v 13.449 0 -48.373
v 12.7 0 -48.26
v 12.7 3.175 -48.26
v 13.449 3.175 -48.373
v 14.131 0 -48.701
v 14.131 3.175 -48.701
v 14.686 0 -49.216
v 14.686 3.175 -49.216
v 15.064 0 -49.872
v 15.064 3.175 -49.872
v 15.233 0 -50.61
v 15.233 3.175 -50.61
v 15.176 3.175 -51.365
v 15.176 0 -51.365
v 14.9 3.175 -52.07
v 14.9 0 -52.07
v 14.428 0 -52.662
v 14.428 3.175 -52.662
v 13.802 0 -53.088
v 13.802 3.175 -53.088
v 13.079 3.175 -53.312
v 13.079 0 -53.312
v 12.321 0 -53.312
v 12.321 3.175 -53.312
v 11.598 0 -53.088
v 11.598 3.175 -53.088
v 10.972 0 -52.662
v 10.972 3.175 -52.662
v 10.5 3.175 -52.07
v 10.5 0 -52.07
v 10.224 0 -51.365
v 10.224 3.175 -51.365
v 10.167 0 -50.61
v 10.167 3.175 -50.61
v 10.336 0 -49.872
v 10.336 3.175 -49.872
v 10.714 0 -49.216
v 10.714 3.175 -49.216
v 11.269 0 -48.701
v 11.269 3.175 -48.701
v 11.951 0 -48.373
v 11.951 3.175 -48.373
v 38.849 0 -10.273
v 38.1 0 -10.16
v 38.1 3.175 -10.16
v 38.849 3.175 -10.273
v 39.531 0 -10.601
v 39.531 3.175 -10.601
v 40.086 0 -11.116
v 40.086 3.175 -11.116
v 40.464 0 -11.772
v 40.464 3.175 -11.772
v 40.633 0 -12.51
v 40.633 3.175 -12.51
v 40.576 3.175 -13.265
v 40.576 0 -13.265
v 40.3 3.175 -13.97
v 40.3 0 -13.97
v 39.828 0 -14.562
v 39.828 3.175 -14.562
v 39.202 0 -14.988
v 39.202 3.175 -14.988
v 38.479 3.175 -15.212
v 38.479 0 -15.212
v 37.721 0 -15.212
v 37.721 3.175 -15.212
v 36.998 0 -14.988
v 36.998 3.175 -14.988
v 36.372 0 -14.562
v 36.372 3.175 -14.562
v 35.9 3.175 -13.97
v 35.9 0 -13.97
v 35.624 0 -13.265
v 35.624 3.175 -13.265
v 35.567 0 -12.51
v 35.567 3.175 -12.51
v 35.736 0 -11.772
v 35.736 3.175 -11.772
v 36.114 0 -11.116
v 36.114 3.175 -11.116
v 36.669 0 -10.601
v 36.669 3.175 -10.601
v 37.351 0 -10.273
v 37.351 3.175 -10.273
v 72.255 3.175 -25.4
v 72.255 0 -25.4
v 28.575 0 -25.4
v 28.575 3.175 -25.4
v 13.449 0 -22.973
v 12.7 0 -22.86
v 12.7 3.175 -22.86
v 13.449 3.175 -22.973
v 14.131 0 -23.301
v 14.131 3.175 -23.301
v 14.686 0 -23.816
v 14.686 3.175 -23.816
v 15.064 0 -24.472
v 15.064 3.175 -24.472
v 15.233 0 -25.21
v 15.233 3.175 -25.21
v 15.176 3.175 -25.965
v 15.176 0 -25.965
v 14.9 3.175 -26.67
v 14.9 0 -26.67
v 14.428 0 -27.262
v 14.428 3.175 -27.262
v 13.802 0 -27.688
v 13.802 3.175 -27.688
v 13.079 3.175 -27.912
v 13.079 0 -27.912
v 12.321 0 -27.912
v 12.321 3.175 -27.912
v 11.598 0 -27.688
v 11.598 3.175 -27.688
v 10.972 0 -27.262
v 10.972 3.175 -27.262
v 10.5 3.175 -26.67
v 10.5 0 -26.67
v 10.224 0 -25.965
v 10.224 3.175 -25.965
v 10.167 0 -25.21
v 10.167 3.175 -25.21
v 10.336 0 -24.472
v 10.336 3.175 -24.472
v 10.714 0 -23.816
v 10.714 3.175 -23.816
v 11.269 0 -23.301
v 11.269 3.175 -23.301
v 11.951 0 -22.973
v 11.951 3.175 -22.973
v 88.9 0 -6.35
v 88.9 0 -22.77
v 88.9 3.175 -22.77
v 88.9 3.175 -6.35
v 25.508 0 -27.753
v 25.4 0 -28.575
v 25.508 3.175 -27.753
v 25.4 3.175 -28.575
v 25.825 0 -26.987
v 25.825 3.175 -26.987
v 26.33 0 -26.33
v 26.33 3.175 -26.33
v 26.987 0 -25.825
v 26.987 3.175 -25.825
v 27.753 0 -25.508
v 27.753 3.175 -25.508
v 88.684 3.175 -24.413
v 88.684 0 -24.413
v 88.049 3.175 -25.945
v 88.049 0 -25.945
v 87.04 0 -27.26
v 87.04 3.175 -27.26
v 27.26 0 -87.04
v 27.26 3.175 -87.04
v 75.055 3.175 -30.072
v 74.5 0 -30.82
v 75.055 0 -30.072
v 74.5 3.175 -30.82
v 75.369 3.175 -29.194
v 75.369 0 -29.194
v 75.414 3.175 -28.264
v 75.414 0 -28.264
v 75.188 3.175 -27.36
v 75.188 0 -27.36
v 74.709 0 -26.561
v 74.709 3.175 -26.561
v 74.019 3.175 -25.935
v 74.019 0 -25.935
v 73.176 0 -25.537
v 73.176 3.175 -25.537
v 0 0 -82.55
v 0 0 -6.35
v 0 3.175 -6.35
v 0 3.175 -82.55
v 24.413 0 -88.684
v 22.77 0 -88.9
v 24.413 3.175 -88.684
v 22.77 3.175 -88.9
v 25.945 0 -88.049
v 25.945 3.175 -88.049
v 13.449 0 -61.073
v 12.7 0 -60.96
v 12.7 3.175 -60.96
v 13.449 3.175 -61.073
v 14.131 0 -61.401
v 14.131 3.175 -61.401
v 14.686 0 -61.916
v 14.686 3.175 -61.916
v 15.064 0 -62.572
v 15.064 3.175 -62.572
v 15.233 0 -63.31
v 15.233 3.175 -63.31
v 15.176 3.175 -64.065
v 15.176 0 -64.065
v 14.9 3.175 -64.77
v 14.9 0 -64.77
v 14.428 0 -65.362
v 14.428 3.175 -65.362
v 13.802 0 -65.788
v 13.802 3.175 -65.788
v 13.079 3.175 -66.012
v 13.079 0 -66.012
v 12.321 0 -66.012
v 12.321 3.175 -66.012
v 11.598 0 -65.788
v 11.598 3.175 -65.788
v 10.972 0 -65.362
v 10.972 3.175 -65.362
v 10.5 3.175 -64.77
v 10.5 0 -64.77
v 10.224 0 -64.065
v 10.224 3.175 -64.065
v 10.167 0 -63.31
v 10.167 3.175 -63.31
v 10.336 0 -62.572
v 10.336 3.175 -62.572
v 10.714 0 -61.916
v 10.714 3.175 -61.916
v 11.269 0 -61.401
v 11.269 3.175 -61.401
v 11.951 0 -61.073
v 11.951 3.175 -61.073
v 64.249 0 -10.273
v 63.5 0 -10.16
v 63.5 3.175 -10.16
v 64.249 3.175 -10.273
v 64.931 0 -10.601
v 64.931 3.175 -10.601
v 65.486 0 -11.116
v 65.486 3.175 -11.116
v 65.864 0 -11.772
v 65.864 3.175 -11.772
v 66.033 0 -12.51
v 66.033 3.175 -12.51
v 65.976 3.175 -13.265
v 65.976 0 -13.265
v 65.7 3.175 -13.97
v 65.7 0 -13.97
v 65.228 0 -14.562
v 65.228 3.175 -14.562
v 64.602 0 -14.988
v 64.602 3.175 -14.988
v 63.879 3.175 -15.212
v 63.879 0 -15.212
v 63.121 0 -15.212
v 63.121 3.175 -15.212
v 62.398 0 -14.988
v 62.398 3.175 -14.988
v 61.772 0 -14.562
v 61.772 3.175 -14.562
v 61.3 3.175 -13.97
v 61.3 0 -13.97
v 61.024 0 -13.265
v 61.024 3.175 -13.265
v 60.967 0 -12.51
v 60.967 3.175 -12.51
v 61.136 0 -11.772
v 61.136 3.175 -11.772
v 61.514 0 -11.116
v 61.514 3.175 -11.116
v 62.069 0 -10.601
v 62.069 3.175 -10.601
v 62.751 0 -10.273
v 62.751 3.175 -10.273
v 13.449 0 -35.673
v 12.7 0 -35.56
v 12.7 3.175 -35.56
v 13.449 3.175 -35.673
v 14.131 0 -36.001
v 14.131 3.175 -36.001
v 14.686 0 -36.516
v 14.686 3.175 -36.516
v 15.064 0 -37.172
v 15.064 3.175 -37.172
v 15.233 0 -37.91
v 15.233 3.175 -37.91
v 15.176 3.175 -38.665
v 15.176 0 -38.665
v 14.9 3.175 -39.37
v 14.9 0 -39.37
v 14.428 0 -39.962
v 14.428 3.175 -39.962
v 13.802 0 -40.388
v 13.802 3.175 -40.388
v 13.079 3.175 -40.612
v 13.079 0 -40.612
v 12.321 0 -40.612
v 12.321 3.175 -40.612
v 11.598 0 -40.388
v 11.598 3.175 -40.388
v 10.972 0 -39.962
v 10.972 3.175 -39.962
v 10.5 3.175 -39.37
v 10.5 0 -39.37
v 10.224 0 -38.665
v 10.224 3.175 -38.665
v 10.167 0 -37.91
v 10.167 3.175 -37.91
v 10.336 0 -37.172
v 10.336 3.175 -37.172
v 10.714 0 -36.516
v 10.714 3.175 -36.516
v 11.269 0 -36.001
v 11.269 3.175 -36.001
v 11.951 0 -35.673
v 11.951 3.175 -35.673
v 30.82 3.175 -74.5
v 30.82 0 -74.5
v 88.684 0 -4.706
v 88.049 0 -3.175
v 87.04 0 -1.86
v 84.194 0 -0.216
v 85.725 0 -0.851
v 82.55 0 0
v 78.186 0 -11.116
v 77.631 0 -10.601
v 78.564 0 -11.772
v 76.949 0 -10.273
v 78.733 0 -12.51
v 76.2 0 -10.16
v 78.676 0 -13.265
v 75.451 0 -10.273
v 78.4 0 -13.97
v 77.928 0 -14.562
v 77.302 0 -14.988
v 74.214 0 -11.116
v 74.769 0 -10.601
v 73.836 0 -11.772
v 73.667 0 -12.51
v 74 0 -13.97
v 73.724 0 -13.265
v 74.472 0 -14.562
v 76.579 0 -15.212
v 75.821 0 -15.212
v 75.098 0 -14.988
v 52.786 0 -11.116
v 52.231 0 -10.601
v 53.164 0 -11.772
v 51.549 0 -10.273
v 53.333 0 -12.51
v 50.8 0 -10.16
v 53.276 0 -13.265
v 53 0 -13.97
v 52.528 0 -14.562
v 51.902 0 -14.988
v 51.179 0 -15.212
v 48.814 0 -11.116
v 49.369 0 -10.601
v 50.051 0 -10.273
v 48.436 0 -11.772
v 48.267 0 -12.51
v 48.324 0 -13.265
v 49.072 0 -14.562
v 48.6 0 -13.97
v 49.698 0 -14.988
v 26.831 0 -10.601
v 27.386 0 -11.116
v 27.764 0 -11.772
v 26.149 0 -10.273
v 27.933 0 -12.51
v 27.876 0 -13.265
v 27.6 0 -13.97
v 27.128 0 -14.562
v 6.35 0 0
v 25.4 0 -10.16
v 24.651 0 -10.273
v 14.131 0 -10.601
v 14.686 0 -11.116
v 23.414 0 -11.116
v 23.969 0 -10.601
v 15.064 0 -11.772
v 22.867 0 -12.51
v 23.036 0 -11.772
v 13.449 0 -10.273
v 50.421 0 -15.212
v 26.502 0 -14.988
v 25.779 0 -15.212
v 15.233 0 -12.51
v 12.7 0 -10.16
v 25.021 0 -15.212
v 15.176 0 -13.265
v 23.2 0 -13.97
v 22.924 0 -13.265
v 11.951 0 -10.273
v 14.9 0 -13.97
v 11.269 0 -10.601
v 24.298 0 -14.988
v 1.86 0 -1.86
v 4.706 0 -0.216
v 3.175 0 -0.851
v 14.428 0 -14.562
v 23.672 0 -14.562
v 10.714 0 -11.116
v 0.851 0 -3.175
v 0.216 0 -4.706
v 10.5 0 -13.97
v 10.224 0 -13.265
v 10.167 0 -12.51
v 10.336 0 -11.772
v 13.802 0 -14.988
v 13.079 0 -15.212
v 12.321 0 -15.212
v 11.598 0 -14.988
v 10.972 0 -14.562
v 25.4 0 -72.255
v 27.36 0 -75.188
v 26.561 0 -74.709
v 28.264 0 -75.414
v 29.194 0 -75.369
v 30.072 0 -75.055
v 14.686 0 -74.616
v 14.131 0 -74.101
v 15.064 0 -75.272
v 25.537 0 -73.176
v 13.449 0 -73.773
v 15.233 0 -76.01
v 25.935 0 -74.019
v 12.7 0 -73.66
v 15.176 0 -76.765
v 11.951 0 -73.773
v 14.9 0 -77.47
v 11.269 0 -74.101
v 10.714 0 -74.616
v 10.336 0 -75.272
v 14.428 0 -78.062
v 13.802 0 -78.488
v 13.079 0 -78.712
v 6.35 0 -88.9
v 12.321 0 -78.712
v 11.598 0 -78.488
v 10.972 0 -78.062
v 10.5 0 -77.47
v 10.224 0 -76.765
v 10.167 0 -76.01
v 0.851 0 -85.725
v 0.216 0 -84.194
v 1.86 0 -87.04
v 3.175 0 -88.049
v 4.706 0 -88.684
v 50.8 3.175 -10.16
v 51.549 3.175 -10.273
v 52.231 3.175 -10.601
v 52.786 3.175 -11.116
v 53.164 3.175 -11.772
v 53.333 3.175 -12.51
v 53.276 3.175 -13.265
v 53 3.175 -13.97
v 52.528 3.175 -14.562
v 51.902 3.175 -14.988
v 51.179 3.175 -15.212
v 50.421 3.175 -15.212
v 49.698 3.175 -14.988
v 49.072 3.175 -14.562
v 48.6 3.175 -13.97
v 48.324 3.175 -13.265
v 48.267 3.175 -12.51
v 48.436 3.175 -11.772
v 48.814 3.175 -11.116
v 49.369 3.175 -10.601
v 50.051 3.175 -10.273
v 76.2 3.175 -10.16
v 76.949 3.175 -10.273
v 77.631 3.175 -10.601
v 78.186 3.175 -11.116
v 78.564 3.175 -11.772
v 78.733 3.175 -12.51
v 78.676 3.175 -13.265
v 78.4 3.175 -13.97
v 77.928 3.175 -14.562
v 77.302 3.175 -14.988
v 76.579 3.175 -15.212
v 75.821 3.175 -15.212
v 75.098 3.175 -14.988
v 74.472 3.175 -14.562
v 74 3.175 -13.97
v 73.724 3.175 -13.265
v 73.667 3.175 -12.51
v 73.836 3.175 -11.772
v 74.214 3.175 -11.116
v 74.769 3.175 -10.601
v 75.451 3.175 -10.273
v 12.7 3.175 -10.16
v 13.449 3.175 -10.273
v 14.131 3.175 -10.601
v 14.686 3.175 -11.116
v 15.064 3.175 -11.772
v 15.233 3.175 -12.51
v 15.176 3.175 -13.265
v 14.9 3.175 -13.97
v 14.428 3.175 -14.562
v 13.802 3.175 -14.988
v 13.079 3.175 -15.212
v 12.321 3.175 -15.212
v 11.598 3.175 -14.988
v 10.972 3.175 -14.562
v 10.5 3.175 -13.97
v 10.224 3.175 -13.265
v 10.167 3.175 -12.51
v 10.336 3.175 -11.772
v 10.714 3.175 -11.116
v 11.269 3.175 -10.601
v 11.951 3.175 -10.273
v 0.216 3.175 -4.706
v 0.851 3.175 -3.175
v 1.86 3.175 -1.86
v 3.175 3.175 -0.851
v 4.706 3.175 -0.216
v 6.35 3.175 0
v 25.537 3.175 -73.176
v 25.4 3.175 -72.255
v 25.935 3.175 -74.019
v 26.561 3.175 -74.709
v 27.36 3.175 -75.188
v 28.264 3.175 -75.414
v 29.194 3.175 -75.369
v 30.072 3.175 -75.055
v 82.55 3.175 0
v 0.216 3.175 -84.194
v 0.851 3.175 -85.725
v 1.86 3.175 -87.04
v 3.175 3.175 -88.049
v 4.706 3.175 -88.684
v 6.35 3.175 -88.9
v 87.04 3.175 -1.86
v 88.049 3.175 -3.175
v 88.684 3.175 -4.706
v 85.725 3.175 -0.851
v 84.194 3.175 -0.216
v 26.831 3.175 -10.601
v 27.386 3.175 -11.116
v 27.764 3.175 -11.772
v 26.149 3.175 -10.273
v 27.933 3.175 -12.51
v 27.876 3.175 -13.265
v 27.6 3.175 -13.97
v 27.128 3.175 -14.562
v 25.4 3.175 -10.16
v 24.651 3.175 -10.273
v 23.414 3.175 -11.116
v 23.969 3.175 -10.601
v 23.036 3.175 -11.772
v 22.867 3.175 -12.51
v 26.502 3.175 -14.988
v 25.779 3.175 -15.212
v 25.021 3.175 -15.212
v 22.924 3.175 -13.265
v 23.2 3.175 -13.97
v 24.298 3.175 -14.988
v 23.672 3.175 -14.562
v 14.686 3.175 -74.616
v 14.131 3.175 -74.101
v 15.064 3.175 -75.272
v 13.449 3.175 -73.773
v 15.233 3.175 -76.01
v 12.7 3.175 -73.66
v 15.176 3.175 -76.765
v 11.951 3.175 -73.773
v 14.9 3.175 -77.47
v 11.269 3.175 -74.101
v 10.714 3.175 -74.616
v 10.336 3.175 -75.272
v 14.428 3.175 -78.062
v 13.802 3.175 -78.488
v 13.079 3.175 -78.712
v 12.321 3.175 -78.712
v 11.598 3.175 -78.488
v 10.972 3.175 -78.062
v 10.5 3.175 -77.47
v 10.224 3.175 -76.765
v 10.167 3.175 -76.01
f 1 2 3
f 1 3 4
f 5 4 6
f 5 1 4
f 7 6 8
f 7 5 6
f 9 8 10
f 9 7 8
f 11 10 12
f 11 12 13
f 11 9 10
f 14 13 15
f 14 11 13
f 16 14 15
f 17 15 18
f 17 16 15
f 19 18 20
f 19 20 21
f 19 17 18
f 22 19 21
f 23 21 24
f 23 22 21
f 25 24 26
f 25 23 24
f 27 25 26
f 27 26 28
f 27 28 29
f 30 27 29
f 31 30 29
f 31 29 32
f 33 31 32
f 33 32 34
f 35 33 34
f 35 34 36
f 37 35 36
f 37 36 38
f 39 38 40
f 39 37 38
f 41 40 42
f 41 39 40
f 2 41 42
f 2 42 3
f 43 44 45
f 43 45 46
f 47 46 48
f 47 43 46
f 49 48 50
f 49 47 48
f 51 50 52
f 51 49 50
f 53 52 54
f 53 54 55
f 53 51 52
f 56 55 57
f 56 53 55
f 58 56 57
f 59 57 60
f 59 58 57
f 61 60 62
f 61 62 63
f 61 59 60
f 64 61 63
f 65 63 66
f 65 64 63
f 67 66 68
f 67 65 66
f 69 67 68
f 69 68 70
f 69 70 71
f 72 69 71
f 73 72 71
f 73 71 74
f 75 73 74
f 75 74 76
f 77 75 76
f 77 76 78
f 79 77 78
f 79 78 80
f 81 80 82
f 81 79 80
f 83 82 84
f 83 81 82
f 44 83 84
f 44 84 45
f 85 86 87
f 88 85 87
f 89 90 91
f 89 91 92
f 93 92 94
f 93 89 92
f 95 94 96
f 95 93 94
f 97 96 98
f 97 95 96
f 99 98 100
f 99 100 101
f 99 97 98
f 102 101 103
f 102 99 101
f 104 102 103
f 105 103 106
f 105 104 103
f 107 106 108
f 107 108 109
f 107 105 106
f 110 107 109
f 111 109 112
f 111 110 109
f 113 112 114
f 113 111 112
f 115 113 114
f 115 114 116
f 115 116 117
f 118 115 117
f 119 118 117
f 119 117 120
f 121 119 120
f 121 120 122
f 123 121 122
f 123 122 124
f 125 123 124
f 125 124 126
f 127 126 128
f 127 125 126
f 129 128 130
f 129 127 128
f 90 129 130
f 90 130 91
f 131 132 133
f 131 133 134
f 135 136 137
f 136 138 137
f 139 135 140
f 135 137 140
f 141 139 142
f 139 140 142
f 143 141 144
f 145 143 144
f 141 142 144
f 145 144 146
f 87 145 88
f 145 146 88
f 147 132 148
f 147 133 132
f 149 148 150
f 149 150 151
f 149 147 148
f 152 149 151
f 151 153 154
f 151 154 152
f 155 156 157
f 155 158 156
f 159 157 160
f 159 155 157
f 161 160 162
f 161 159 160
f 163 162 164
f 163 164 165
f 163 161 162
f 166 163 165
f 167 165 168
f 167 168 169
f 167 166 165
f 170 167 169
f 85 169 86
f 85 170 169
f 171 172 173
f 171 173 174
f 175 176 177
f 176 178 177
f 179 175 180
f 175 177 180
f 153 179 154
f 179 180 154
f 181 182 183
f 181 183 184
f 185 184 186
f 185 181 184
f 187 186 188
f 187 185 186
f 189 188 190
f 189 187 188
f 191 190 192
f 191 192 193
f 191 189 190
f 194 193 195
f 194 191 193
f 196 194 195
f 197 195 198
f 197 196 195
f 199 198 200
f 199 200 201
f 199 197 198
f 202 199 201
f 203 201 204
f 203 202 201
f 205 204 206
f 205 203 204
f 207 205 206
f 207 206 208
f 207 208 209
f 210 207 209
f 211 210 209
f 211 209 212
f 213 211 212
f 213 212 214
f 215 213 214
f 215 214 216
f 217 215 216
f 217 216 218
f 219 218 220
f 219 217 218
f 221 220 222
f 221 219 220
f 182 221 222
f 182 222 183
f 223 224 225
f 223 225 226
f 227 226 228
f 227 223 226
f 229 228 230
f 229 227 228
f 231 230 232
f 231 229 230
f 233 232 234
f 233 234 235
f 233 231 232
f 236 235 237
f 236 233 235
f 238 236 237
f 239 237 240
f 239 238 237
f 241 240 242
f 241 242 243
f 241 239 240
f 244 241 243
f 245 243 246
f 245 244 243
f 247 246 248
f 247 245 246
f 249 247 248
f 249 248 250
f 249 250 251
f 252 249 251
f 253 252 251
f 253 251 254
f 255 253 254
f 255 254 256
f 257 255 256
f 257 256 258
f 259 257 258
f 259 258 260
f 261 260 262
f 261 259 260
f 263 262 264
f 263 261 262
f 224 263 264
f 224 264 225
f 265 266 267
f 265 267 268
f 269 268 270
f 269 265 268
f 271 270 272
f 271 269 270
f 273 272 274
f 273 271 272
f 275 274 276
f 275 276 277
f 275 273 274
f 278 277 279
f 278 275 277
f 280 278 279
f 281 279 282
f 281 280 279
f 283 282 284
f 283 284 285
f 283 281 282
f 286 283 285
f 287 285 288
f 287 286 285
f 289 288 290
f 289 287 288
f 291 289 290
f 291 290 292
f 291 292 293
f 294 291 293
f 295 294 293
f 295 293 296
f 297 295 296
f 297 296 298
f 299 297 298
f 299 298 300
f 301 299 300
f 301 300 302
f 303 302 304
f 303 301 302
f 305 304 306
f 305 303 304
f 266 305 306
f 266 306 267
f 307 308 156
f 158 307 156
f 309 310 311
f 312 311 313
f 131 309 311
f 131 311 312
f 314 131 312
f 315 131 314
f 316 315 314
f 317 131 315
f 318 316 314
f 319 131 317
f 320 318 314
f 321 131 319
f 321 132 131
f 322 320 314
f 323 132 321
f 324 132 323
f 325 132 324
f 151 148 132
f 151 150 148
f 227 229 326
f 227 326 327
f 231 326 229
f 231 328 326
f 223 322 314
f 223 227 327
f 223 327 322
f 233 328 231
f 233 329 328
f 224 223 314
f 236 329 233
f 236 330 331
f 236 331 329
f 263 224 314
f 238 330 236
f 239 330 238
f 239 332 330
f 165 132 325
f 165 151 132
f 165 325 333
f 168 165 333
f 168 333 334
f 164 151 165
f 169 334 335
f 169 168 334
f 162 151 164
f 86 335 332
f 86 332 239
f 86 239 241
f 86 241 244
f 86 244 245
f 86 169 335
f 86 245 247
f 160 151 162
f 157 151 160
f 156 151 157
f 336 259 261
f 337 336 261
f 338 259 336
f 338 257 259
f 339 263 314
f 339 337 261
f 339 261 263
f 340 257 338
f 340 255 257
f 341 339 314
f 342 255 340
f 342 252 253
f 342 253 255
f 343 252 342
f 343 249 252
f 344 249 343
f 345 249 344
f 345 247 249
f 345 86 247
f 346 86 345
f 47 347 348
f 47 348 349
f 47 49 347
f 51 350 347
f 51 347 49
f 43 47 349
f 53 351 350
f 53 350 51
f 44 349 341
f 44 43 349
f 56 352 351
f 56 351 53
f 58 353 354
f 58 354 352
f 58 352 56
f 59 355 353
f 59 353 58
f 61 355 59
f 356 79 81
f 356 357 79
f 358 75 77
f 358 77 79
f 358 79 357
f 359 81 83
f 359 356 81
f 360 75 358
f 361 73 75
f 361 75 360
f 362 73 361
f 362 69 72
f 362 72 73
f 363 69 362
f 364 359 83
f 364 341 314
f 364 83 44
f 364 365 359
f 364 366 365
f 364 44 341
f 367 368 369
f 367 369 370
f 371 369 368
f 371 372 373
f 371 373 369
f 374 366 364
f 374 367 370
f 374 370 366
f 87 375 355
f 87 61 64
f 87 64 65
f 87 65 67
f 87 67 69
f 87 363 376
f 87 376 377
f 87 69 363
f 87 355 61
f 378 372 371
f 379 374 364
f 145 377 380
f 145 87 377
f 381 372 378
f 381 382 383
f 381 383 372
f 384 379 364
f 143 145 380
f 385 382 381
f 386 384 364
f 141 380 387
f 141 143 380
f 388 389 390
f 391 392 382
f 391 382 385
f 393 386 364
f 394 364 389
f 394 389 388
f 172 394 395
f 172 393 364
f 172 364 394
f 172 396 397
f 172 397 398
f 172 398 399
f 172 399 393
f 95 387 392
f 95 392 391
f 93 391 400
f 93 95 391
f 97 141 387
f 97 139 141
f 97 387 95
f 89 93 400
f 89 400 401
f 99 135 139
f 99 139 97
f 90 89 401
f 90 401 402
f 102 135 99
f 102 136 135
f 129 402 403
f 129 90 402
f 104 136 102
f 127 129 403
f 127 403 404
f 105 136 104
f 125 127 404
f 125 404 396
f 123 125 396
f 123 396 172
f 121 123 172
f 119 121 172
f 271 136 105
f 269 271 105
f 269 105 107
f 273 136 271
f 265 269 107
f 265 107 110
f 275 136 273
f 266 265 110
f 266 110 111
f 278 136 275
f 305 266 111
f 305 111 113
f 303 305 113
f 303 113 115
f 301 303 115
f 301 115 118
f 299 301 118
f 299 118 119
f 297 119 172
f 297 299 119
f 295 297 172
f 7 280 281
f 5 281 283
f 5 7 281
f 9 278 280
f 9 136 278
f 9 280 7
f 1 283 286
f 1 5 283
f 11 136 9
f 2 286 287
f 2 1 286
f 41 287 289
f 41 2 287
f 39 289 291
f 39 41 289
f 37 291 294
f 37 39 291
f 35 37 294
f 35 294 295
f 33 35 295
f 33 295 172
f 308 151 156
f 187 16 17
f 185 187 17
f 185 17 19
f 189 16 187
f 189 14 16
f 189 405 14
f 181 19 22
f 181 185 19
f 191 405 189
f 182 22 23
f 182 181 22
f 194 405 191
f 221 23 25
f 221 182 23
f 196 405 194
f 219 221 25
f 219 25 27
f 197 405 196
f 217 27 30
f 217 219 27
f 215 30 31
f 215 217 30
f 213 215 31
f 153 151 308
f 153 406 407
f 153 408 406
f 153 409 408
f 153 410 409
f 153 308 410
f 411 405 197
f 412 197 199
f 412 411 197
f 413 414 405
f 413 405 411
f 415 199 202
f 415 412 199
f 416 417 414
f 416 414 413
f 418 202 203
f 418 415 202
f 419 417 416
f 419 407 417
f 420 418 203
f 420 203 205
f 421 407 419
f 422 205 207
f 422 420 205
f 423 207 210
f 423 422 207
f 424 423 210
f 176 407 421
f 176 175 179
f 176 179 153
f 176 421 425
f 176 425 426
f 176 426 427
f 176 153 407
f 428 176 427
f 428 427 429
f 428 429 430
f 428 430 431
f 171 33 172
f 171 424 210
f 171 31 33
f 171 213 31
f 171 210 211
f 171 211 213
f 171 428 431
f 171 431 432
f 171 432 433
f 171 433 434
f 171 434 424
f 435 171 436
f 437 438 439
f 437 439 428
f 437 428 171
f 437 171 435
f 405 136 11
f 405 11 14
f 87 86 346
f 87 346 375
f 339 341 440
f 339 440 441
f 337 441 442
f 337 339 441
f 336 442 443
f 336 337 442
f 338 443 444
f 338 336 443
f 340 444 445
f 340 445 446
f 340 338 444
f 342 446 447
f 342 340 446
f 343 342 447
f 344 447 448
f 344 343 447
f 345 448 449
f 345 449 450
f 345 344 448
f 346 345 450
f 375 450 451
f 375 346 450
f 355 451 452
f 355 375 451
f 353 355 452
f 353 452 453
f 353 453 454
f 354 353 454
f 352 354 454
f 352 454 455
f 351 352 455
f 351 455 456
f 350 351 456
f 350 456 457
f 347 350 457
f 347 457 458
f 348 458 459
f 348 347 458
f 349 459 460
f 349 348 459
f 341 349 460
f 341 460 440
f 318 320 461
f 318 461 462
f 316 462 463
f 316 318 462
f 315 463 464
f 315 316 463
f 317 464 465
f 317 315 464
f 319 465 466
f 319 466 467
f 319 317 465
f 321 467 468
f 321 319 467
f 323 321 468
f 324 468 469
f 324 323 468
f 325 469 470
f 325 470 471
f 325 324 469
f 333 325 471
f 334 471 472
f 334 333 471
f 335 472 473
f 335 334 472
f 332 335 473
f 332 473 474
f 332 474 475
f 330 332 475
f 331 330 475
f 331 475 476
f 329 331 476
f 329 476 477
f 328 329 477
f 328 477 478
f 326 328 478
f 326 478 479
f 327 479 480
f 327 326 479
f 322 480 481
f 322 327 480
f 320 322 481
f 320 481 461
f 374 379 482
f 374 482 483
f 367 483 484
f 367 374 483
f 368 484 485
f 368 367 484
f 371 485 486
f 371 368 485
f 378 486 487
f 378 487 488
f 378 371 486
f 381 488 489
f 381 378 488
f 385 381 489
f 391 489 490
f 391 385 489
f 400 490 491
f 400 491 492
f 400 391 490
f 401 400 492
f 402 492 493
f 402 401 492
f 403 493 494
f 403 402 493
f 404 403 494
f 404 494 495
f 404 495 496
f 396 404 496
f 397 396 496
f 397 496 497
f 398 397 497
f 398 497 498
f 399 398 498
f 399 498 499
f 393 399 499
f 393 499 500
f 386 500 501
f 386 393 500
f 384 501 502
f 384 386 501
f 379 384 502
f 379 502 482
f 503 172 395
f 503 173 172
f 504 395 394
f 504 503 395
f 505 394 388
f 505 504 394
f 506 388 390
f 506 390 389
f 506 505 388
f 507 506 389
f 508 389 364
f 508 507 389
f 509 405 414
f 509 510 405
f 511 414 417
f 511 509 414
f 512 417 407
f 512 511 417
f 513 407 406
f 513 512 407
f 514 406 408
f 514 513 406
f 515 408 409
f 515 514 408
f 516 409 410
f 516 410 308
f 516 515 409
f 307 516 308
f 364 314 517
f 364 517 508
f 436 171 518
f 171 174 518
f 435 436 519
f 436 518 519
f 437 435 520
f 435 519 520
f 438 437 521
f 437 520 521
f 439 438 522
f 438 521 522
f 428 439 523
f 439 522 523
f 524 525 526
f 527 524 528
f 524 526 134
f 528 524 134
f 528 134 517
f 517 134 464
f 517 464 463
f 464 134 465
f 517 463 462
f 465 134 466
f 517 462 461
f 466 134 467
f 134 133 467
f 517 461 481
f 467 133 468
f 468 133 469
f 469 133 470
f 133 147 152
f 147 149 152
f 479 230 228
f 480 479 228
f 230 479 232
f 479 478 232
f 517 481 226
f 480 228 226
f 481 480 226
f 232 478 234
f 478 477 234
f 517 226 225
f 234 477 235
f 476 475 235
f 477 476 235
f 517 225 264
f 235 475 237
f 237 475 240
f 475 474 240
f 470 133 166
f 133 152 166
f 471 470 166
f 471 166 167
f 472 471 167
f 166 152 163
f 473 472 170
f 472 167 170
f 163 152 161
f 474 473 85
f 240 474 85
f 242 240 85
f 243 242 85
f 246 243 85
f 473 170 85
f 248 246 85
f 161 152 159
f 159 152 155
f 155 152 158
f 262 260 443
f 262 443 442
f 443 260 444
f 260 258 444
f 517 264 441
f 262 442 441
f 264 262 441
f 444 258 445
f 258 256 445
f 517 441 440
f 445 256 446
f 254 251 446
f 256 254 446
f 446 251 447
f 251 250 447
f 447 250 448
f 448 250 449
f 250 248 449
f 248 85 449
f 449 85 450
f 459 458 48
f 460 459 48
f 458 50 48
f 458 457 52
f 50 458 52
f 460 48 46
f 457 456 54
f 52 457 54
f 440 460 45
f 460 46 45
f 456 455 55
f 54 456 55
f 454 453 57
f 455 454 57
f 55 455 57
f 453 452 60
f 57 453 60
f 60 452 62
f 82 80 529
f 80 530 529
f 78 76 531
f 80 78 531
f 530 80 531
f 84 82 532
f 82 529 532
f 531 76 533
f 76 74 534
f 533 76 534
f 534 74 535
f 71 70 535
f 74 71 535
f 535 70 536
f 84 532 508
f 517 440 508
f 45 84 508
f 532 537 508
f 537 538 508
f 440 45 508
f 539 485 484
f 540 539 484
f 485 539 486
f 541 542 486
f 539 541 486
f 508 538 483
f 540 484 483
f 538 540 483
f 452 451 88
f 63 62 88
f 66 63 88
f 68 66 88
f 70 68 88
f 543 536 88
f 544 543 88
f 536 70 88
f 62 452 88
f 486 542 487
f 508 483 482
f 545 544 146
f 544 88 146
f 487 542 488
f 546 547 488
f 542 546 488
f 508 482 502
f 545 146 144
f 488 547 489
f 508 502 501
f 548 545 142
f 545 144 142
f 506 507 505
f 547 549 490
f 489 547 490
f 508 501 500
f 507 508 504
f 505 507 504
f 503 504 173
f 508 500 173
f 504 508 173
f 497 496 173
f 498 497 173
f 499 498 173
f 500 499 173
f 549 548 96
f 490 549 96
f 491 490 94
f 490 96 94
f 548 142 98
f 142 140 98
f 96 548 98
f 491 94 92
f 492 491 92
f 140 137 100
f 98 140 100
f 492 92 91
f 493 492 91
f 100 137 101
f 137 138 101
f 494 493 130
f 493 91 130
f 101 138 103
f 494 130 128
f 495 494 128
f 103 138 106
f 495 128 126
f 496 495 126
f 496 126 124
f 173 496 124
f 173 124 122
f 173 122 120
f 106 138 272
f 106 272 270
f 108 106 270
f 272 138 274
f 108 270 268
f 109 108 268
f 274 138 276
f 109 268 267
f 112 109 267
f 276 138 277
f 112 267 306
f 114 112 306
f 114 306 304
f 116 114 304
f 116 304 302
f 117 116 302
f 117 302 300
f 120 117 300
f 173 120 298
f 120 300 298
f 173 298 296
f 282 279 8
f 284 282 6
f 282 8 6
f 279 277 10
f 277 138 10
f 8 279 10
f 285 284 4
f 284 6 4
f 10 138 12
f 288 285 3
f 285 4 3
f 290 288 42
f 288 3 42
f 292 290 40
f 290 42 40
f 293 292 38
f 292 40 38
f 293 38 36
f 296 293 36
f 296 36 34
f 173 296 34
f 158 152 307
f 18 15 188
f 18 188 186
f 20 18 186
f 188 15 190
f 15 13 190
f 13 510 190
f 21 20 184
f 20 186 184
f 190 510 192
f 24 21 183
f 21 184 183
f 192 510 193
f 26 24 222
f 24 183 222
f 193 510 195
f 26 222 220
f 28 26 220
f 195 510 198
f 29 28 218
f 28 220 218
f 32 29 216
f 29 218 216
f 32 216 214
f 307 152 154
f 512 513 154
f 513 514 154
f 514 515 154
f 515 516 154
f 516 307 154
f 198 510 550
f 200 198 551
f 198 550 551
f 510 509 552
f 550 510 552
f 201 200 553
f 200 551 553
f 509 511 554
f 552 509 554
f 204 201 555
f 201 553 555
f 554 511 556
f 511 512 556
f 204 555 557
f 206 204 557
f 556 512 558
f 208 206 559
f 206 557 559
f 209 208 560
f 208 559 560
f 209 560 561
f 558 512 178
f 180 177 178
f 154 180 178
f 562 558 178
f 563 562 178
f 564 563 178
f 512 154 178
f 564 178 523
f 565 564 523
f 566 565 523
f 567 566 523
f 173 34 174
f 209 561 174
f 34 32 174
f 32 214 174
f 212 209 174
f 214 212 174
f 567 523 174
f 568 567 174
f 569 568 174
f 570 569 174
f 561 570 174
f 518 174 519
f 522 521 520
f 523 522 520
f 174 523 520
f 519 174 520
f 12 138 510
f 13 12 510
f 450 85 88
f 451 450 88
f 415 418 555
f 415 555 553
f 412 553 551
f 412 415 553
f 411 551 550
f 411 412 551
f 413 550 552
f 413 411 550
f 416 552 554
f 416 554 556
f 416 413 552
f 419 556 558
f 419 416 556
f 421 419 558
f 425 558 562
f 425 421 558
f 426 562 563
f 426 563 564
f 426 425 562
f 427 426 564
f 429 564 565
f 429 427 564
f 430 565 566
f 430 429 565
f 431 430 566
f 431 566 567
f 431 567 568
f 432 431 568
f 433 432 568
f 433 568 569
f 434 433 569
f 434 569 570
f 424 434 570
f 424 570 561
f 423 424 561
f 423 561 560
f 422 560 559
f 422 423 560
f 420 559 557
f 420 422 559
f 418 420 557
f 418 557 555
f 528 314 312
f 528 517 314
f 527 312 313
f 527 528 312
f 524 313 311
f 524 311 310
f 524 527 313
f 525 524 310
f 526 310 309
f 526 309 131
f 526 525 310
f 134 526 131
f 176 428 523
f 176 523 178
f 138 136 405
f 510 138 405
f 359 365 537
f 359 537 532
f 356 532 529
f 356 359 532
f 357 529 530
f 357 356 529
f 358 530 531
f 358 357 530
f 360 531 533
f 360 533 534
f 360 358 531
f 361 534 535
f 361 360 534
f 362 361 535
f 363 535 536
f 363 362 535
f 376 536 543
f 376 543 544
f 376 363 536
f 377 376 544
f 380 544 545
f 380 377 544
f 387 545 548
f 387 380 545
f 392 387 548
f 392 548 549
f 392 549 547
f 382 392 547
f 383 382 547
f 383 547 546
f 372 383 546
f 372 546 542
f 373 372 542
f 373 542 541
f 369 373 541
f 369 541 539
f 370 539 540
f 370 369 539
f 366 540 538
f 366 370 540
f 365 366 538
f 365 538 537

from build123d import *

# Parameters (mm, degrees)
SKETCH1_R           = 2.54
BOSS_EXTRUDE1_DEPTH = 3.175
FILLET1_R           = 6.35
FILLET2_R           = 3.175


with BuildPart() as part:
    # Sketch1 → Boss-Extrude1 (new body)
    with BuildSketch(Plane(origin=(0, 0, 0), x_dir=(1, 0, 0), z_dir=(0, 1, 0))):
        Polygon((0, 0), (0, 88.9), (25.4, 88.9), (88.9, 25.4), (88.9, 0), align=None)
        with Locations(Location((12.7, 12.7, 0), (0, 0, 270))):
            Circle(SKETCH1_R, mode=Mode.SUBTRACT)
        with Locations(Location((25.4, 12.7, 0), (0, 0, 270))):
            Circle(SKETCH1_R, mode=Mode.SUBTRACT)
        with Locations(Location((38.1, 12.7, 0), (0, 0, 270))):
            Circle(SKETCH1_R, mode=Mode.SUBTRACT)
        with Locations(Location((50.8, 12.7, 0), (0, 0, 270))):
            Circle(SKETCH1_R, mode=Mode.SUBTRACT)
        with Locations(Location((63.5, 12.7, 0), (0, 0, 270))):
            Circle(SKETCH1_R, mode=Mode.SUBTRACT)
        with Locations(Location((76.2, 12.7, 0), (0, 0, 270))):
            Circle(SKETCH1_R, mode=Mode.SUBTRACT)
        with Locations(Location((12.7, 25.4, 0), (0, 0, 270))):
            Circle(SKETCH1_R, mode=Mode.SUBTRACT)
        with Locations(Location((12.7, 38.1, 0), (0, 0, 270))):
            Circle(SKETCH1_R, mode=Mode.SUBTRACT)
        with Locations(Location((12.7, 50.8, 0), (0, 0, 270))):
            Circle(SKETCH1_R, mode=Mode.SUBTRACT)
        with Locations(Location((12.7, 63.5, 0), (0, 0, 270))):
            Circle(SKETCH1_R, mode=Mode.SUBTRACT)
        with Locations(Location((12.7, 76.2, 0), (0, 0, 270))):
            Circle(SKETCH1_R, mode=Mode.SUBTRACT)
        Polygon((25.4, 25.4), (25.4, 79.919743879), (79.919743879, 25.4), align=None, mode=Mode.SUBTRACT)
    extrude(amount=BOSS_EXTRUDE1_DEPTH)

    # Fillet1
    fillet1_edges = [part.edges().sort_by_distance(p)[0] for p in [
        (0, 1.5875, 0),
        (0, 1.5875, -88.9),
        (25.4, 1.5875, -88.9),
        (88.9, 1.5875, -25.4),
        (88.9, 1.5875, 0),
    ]]
    fillet(fillet1_edges, radius=FILLET1_R)

    # Fillet2
    fillet2_edges = [part.edges().sort_by_distance(p)[0] for p in [
        (25.4, 1.5875, -25.4),
        (79.919743879, 1.5875, -25.4),
        (25.4, 1.5875, -79.919743879),
    ]]
    fillet(fillet2_edges, radius=FILLET2_R)


solid = part.part
